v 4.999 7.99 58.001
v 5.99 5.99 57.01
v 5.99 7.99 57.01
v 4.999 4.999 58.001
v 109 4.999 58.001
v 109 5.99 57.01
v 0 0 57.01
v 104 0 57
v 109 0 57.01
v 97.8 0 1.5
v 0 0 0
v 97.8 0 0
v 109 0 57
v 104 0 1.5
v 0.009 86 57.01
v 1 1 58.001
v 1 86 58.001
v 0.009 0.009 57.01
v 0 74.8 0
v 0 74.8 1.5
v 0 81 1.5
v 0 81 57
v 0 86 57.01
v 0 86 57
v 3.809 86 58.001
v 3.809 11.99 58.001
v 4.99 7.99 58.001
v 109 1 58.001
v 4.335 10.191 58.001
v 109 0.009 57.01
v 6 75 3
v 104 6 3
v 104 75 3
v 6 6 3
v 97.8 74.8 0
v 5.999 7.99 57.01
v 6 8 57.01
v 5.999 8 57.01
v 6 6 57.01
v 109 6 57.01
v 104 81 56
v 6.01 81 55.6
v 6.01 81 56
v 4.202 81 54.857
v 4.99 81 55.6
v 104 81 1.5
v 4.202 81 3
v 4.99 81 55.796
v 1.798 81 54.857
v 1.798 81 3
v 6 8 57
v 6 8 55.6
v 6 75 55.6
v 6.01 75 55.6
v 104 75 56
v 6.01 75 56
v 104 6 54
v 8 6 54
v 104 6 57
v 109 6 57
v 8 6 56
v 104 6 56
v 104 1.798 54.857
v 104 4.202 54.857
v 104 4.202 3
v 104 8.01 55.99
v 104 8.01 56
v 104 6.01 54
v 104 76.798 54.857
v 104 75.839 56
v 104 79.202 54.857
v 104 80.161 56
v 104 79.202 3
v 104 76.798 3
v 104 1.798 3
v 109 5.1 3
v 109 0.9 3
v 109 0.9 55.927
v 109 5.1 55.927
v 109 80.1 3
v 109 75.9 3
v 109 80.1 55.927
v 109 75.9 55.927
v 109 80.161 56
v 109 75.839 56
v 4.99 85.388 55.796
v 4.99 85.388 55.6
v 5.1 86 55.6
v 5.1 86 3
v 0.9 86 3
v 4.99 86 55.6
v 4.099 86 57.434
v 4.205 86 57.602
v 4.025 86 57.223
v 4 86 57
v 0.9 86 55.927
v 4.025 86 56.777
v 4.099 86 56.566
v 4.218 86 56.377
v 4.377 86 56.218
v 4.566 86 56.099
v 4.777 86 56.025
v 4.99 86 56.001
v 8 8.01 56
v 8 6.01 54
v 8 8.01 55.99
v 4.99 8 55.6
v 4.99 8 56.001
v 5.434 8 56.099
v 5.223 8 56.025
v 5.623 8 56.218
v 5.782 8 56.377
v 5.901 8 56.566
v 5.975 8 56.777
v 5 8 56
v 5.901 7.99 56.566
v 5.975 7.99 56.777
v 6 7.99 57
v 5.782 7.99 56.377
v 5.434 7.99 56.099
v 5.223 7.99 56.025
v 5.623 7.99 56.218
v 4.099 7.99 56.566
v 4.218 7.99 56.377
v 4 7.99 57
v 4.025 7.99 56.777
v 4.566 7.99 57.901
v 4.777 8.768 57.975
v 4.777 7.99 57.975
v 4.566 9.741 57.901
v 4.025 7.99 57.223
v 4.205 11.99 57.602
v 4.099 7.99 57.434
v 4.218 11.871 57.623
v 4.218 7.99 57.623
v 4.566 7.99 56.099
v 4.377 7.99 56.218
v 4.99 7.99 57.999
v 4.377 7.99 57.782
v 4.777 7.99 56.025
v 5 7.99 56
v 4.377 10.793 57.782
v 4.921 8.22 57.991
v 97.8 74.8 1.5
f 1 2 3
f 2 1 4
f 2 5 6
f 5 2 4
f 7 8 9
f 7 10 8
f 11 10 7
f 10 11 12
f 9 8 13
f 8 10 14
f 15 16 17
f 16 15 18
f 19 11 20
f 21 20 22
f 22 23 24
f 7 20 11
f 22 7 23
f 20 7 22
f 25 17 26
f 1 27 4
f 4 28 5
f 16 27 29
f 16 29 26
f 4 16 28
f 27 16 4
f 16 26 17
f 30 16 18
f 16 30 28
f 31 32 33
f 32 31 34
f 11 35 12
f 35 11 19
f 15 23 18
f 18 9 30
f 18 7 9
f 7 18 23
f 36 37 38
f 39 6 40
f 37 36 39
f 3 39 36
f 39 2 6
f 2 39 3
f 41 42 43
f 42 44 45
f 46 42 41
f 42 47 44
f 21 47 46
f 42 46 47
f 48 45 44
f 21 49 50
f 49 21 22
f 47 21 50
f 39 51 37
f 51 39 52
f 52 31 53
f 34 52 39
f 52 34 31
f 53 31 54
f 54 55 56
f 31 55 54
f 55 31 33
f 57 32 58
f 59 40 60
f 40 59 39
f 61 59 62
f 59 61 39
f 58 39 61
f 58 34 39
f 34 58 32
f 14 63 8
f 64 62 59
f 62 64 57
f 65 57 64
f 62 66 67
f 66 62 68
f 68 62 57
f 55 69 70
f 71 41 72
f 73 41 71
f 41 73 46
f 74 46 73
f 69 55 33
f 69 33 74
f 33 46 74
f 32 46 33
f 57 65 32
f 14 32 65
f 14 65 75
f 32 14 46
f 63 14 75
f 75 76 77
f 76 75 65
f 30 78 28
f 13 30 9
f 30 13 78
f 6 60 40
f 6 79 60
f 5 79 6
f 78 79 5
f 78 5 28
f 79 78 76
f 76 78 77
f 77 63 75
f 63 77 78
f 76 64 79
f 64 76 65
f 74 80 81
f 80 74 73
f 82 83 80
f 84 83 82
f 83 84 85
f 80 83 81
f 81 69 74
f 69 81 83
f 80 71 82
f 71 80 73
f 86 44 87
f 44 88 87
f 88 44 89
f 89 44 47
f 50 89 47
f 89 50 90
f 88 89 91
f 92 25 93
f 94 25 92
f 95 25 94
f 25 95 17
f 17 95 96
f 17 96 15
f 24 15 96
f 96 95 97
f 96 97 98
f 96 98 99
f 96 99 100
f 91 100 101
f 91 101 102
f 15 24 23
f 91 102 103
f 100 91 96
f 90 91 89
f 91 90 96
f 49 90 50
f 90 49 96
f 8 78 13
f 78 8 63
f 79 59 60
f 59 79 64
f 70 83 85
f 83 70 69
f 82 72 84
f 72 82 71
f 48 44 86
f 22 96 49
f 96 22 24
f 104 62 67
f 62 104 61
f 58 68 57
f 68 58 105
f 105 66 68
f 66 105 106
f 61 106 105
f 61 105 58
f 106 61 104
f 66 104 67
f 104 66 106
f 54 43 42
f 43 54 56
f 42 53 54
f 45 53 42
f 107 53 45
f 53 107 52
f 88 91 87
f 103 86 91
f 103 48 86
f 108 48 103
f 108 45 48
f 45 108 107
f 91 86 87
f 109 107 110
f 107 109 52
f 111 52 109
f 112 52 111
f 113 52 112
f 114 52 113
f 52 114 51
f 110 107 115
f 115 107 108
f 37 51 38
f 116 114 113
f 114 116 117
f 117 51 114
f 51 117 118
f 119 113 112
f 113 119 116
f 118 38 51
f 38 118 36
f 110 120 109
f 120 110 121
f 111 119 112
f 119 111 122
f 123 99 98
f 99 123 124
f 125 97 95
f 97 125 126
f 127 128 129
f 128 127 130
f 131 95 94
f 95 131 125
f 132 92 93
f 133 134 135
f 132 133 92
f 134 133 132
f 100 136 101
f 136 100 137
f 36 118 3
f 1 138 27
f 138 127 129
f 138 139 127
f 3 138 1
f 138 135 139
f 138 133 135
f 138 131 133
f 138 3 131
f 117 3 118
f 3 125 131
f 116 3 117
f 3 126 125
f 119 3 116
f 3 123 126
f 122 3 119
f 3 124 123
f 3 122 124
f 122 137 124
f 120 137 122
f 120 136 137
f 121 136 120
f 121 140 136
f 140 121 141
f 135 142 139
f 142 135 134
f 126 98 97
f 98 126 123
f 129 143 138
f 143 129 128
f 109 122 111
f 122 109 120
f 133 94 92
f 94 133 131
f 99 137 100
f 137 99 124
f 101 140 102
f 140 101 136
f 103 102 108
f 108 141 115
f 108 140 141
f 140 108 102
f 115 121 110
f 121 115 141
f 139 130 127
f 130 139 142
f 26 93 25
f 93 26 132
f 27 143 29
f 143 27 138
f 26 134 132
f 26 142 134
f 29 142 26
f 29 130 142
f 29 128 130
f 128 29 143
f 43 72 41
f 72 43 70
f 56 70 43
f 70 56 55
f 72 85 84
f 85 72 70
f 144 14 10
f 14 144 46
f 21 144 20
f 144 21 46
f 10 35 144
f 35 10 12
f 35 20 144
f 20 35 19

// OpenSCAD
// ============================================================================
// cutlery_box.scad
// Graduated 3-chamber disposable-cutlery box (Option 3) — CUT-FROM-SOLID port
// of build_box.py, for a 120 x 120 x 120 mm printer (AOSEED).
//
// WHY THIS PORT EXISTS (the whole point):
//   The hand-mesh generator (build_box.py) could not keep the 1 mm rim chamfer
//   continuous across the female dovetail joints, because where a slot's flared
//   corner crosses the sloped chamfer it needs a true boolean intersection.
//   OpenSCAD HAS that boolean kernel, so here we do exactly the "cut-from-solid"
//   thing:
//      1. Build the ENTIRE box as ONE solid, WITH the chamfer already on it.
//      2. difference() out vertical dovetail prisms ( /_\ cross-section ),
//         running from just above the base plate up THROUGH the rim, to both
//         (a) form the sliding-dovetail joints, and
//         (b) split the box into 6 bed-sized pieces.
//   Because the cut is a real boolean through the already-chamfered solid, the
//   sloped chamfer<->slot edge is produced for free => the rim chamfer stays
//   CONTINUOUS across every joint, with none of the sliver hacks.
//
// ----------------------------------------------------------------------------
// HOW TO USE
//   In the app:  set `part` below (or use the Customizer dropdown), F5 to
//                preview, F6 to render, then File > Export > STL.
//   One piece (CLI):
//      openscad -o body_knife_A.stl -D 'part="knife_A"' cutlery_box.scad
//   ALL SIX (bash, run from this folder):
//      for p in knife_A knife_B fork_A fork_B spoon_A spoon_B; do \
//        openscad -o "body_$p.stl" -D "part=\"$p\"" cutlery_box.scad ; done
//   PNG preview of one piece:
//      openscad -o knife_B.png --imgsize=1400,1000 --autocenter --viewall \
//        -D 'part="knife_B"' cutlery_box.scad
//
//   Pieces are modelled in ASSEMBLED coordinates (floor-down, z=0 is the bed),
//   so importing all six STLs together shows the assembled box directly; your
//   slicer will auto-drop each one onto the plate for printing.
//
// BED SANITY: every piece is <= 120 mm in X, Y, Z.
//   Z = 58 mm. Widest piece = spoon at 117 mm (Y). A-halves reach 109 mm (X,
//   including the protruding dovetail key). All under 120.
//
// !! I could NOT run OpenSCAD to verify this file (no binary in my sandbox) !!
//   - The rim chamfer is a SMOOTH, true-45 bevel built from hull() frustums of
//     convex rectangles. Works in every OpenSCAD since ~2015 (incl. Homebrew
//     2021.01). No stepped staircase -- and, crucially, it makes box() a clean
//     well-formed solid so the per-part booleans resolve reliably (the old
//     14-slice staircase was fragile and CGAL was dropping the walls of the
//     interior parts, leaving only the key prisms => "floating boxes").
//   - roof() is still available behind USE_ROOF=true for those who have it
//     (2021.01+ snapshots); for THIS rectangular design it is identical, so it
//     is NOT required.
//   - After F6, check the console for "WARNING"/"not a valid 2-manifold".
//     If a tenon ever looks detached, bump EPS to 0.05.
// ============================================================================


/* [Part to render / export] */
part = "knife_A"; // [knife_A, knife_B, fork_A, fork_B, spoon_A, spoon_B, assembly]

/* [Chamfer method] */
// false = smooth hull() frustum bevel (default, any OpenSCAD); true = roof() (2021.01+)
USE_ROOF = false;

/* [Heights (mm)] */
BASE   = 3.0;     // floor / base-plate thickness
COMP_H = 55.0;    // interior wall height above the floor (cutlery stack depth)

/* [Walls (mm)] */
HOST_T   = 6.0;     // thickness of every wall (thick enough to host a dovetail)
HALF_LEN = 104.0;   // printed length of each half (A = near, B = far); <120 incl. key

/* [Chamber bays (mm)] */
N_COL     = 3;       // columns of cutlery per chamber
KNIFE_COL = 23.0;    // -> knife bay 69  (3 x 19 mm knives + play)
FORK_COL  = 33.0;    // -> fork  bay 99  (3 x 29 mm forks  + play)
SPOON_COL = 37.0;    // -> spoon bay 111 (3 x 34 mm spoons + play, trimmed <120)

/* [Dovetail joint (mm)] */
DT_DEPTH = 5.0;   // tail protrusion past the seam (male key depth)
DT_NECK  = 1.2;   // half-width at the seam face (narrow)
DT_FLARE = 2.1;   // half-width at the tip (wide -> locks)
DT_CLR   = 0.4;   // FLANK/seam slide clearance added to the female socket (do not change for fit)
DT_DEPTH_RELIEF = 0.3; // extra depth on the socket BACK only, so the tail tip never bottoms out

/* [Hidden-dovetail top cap / "hat" (mm)] */
// The dovetail otherwise shows its trapezoid outline on the TOP edge of the wall.
// To hide it, the MALE piece extends the wall's full-width top (chamfer included)
// across the key footprint -> a flush, continuous top. The FEMALE piece gets a
// matching top RECESS (cap footprint + CAP_CLR) so the cap drops straight in.
// Result: the top reads as one surface with a single straight seam line at the cap
// tip; the dovetail joinery lives entirely below the cap.
//
// SELF-SUPPORTING UNDERSIDE: the cap reaches the FULL wall width at the chamfer base
// (so the top edge reads as the wall extended, with NO recessed sliver on the outer
// face), and its underside is ONE planar ramp from the chamfer's OUTER CORNER
// (half-width HOST_T/2 at z = BODY_H-CHAMFER) down to the dovetail-neck half-width
// (CAP_FOOT) at CAP_SLANT_DEG from horizontal. No little horizontal step. The ramp
// reaching full width exactly at the chamfer base means "ramp top" == "chamfer base"
// (CAP_H is DERIVED). The FEMALE recess is the same ramp + CAP_CLR play.
// TRADEOFF: because the cap runs all the way to the outer corner, the female wall
// tapers to ~0 at z = BODY_H-CHAMFER -> a thin feather edge at the joint (gradual at
// CAP_SLANT_DEG, hidden inside the joint when assembled). Accepted per design intent.
CAP_SLANT_DEG = 50;     // cap underside ramp angle from horizontal (50 = self-supporting, long flare)
CAP_FOOT = DT_NECK;     // cap-underside half-width where it meets the dovetail neck
CAP_CLR = 0.3;          // slide clearance so the male cap seats into the female top recess

/* [Rim chamfer (mm)] */
CHAMFER = 1.0;    // 45-deg comfort break broken along the top wall edges

/* [Base half-lap / anti-warp (mm)] */
// Neighbouring base plates overlap as a HORIZONTAL half-lap (shiplap) at mid-base
// height, so corners stay coplanar (no lift/protrusion). Horizontal lap faces do
// NOT bind the vertical-drop assembly. Shingle direction: A->B and knife->fork->spoon.
LAP_LEN = 6;        // overlap past the A/B seam and the knife/fork seam
LAP_LEN_FS = 2;     // overlap past the fork/SPOON seam -- SMALLER: spoon is the
                    // tightest piece (117mm of the 120mm bed); a 6mm lap there
                    // would push spoon to 123mm. 2mm keeps spoon at 119mm.
LAP_Z   = BASE/2;   // 1.5 -- horizontal split height of the lap (bottom vs top half)
LAP_CLR = 0.2;      // in-plane clearance so the shelf isn't a press fit

/* [Lid — box features that receive a flat ORDERED clear sheet] */
// The lid itself is NOT printed: it's a flat ~2 mm PETG/Tritan sheet, bullnose-polished
// edges (r=LID_EDGE_R), ordered to size. We only model the box features that receive it.
LID_T            = 2.0;   // ordered sheet thickness
LID_EDGE_R       = 1.0;   // ordered sheet bullnose edge radius (for the sheet order spec)
LID_PLAY         = 0.4;   // total vertical play in the hinge groove (sheet + this)
HINGE_AT_MINUS_X = true;  // hinge on the -x (303mm) end wall; clip on +x. (flip = mirror; default delivered)
// perimeter support ledge (lid underside rests on it at z = BODY_H-LID_T)
LEDGE_W          = 2.0;   // ledge inward protrusion (its underside ramps back at 45 deg -> self-supporting)
GROOVE_END_INSET = CHAMFER + 1.0;  // groove starts one chamfer PAST the corner chamfer (derived from CHAMFER)
GROOVE_TAPER     = 4.0;   // y-length over which the eased mouth tapers out at each groove end
// hinge groove (cut into the inner face of the hinge end wall, CONTINUOUS along the long edge)
GROOVE_DEPTH     = 2.0;   // total depth into the wall (1.0 straight lead-in + 1.0 pocket radius)
GROOVE_POCKET_R  = 1.0;   // journal half-cylinder radius (the bullnose sheet edge rolls in it)
GROOVE_MOUTH_EASE= 1.2;   // 45 deg ease on the slot's inner-top lip so the sheet swings up & lifts out
// clip latch (one localized retainer, centered on the clip end wall)
CLIP_W           = 18.0;  // clip width
CLIP_LIP         = 0.4;   // retaining overhang (0.3 light .. 0.6 firm)
CLIP_RAMP_H      = 1.6;   // cam-ramp height above the rim (press-to-close)
// finger scallop (semicircular dish in the rim, centered on & aligned with the clip)
SCALLOP_W        = 16.0;  // scallop width
SCALLOP_DEPTH    = 6.0;   // how far it dishes down from the rim


/* [Hidden] */
EPS      = 0.01;          // tiny overlap so abutting solids fuse cleanly in CGAL
// Upper-chamber pieces (fork, spoon) were cut by a cell plane laid EXACTLY on the
// divider wall's far face (the lower chamber owns that wall). intersection() along a
// plane coincident with an existing box face makes CGAL leave a ZERO-THICKNESS copy
// of the wall face -> edge-manifold + "watertight" but degenerate (OpenSCAD shows it
// as a blue back-face; Tinkercad thickens it into a phantom block). SEAM_EPS nudges
// those cut planes a hair INTO the open bay so they no longer coincide with any box
// face -> no flap. 0.02 mm is physically nothing but is well clear of CGAL's tolerance.
SEAM_EPS = 0.02;
CUT_OVER = 1.0;           // how far dovetail cutters overshoot the rim (clean cut)

BODY_H    = BASE + COMP_H;     // 58  total height
END_WALL  = HOST_T;            // end walls are dovetail hosts too -> equally thick
TOTAL_LEN = 2 * HALF_LEN;      // 208 assembled length (end wall .. end wall)

// hidden-cap ramp geometry (derived).
//   CAP_HW    = cap MAX half-width = HOST_T/2 (the full wall edge) at the chamfer base.
//   CAP_RISE  = vertical height of the self-supporting CAP_SLANT_DEG underside ramp.
//   CAP_ZRAMP = where the cap reaches full width = the chamfer base (BODY_H-CHAMFER), so
//               the ramp runs straight to the chamfer OUTER CORNER (no horizontal step).
//   CAP_ZBOT  = cap bottom = ramp start; CAP_H derived from it (for reference/report).
//   CAP_ZRAMP_R = recess ramp top, shifted down by CAP_CLR so the recess ramp stays
//               parallel to the cap ramp with uniform play.
CAP_HW      = HOST_T/2;   // cap reaches the FULL wall edge at the chamfer base
CAP_RISE    = (CAP_HW - CAP_FOOT) * tan(CAP_SLANT_DEG);
CAP_ZRAMP   = BODY_H - CHAMFER;               // full width exactly at the chamfer base / outer corner
CAP_ZBOT    = CAP_ZRAMP - CAP_RISE;
CAP_H       = BODY_H - CAP_ZBOT;              // derived; reported
CAP_ZRAMP_R = CAP_ZRAMP;   // recess ramp ALSO tops at the chamfer corner (mirror the cap) -> no vertical lip
// sanity checks
assert(CAP_ZBOT > BASE + 1,
       "cap zone dips too low -- raise CAP_SLANT_DEG");
assert(CAP_HW >= DT_FLARE,
       "cap too narrow to cover the dovetail tail");

// NOTE: lid-derived constants are defined BELOW the Y-layout block, because some of
// them (INTERIOR_Y0/Y1, CLIP_CY) depend on OUTER_L / OUTER_R / EXT_W. See "lid derived".

// bay widths
KNIFE_BAY = N_COL * KNIFE_COL; // 69
FORK_BAY  = N_COL * FORK_COL;  // 99
SPOON_BAY = N_COL * SPOON_COL; // 111

// ---- Y layout (width direction): wall | bay | divider | bay | divider | bay | wall
KNIFE_Y0 = 0;
KNIFE_Y1 = HOST_T + KNIFE_BAY + HOST_T;        // 0..81   (outer wall + bay + divider)
FORK_Y0  = KNIFE_Y1;                           // 81
FORK_Y1  = FORK_Y0 + FORK_BAY + HOST_T;        // 81..186 (bay + divider)
SPOON_Y0 = FORK_Y1;                            // 186
SPOON_Y1 = SPOON_Y0 + SPOON_BAY + HOST_T;      // 186..303(bay + outer wall)
EXT_W    = SPOON_Y1;                           // 303 total width

// lengthwise wall Y-bands [y0,y1] (host the A/B dovetails) + their centers
OUTER_L  = [0, HOST_T];                                       // [0,6]    c=3
DIV_KF   = [HOST_T + KNIFE_BAY, HOST_T + KNIFE_BAY + HOST_T]; // [75,81]  c=78
DIV_FS   = [FORK_Y0 + FORK_BAY, FORK_Y0 + FORK_BAY + HOST_T]; // [180,186]c=183
OUTER_R  = [SPOON_Y1 - HOST_T, SPOON_Y1];                     // [297,303]c=300

// ---- lid derived ---- (placed AFTER OUTER_L/OUTER_R/EXT_W so nothing is forward-referenced)
LID_Z_UNDER = BODY_H - LID_T;             // 56  lid underside / ledge top / lowered-divider top
GROOVE_Z0   = BODY_H - (LID_T + LID_PLAY);// 55.6 groove bottom (top is the rim z=BODY_H, open to drop in)
POCKET_CZ   = BODY_H - LID_T/2;           // 57  journal pocket centre (sheet mid-thickness)
// hinge end-wall inner face x + inward direction; clip end-wall inner face x + inward dir
HINGE_INX   = HINGE_AT_MINUS_X ? END_WALL : TOTAL_LEN - END_WALL;       // 6  (default)
HINGE_IN    = HINGE_AT_MINUS_X ? 1 : -1;  // interior direction from the hinge wall (+x default)
CLIP_INX    = HINGE_AT_MINUS_X ? TOTAL_LEN - END_WALL : END_WALL;       // 202 (default)
CLIP_IN     = HINGE_AT_MINUS_X ? -1 : 1;  // interior direction from the clip wall (-x default)
POCKET_CX   = HINGE_INX - HINGE_IN*(GROOVE_DEPTH - GROOVE_POCKET_R);    // 5  pocket centre x (INTO the wall)
INTERIOR_Y0 = OUTER_L[1];                 // 6   inner face of the -y short wall
INTERIOR_Y1 = OUTER_R[0];                 // 297 inner face of the +y short wall
CLIP_CY     = EXT_W/2;                     // 151.5 clip/scallop centre (in the fork chamber)
assert(LID_Z_UNDER > CAP_ZBOT,
       "lid underside below the cap foot -- check LID_T vs cap geometry");

// the three OPEN bays are rectangular holes in the wall footprint:
//   footprint = outer rectangle MINUS these bays  (== the 6 walls; verified).
// The smooth chamfer is built from exactly this decomposition.
BAY_X0 = END_WALL;              // 6
BAY_X1 = TOTAL_LEN - END_WALL;  // 202
BAYS = [
    [BAY_X0, BAY_X1, HOST_T,   HOST_T + KNIFE_BAY],   // knife bay [6,202] x [6,75]
    [BAY_X0, BAY_X1, FORK_Y0,  FORK_Y0 + FORK_BAY],   // fork  bay [6,202] x [81,180]
    [BAY_X0, BAY_X1, SPOON_Y0, SPOON_Y0 + SPOON_BAY], // spoon bay [6,202] x [186,297]
];

YC_OUTL  = OUTER_L[0] + HOST_T/2;   // 3   outer-left wall center
YC_DIVKF = DIV_KF[0]  + HOST_T/2;   // 78  knife/fork divider center
YC_DIVFS = DIV_FS[0]  + HOST_T/2;   // 183 fork/spoon divider center
YC_OUTR  = OUTER_R[0] + HOST_T/2;   // 300 outer-right wall center

// seams
AB_SEAM = HALF_LEN;               // 104  A/B length seam (x)
SEAM_KF = FORK_Y0;                // 81   knife/fork width seam (y)
SEAM_FS = SPOON_Y0;              // 186  fork/spoon width seam (y)
ENDC_A  = END_WALL/2;             // 3    A end-wall center (x) -> chamber dovetails
ENDC_B  = TOTAL_LEN - END_WALL/2; // 205  B end-wall center (x)


// ============================================================================
// 2D wall footprint (cross-section of all walls, constant in z for the straight
// part). Union of: 2 full-width end walls + 4 lengthwise walls between them.
// ============================================================================
module wall_footprint_2d() {
    // footprint = outer rectangle minus the 3 open bays  (== the 6 walls)
    difference() {
        square([TOTAL_LEN, EXT_W]);
        for (b = BAYS) translate([b[0], b[2]]) square([b[1] - b[0], b[3] - b[2]]);
    }
}

// ============================================================================
// The full chamfered box solid = base plate + walls with a continuous 1 mm
// top-rim chamfer. Built ONCE; every piece is carved out of this.
// ============================================================================
module chamfer_cap() {
    // SMOOTH 45 rim chamfer over z[BODY_H-CHAMFER, BODY_H], in absolute coords.
    zm = BODY_H - CHAMFER;
    if (USE_ROOF) {
        // exact straight-skeleton roof, capped at CHAMFER height (needs roof()).
        intersection() {
            translate([0,0,zm]) roof() wall_footprint_2d();
            translate([0,0,zm]) linear_extrude(CHAMFER + EPS) wall_footprint_2d();
        }
    } else {
        // DEFAULT: true 45 bevel as hull() frustums of CONVEX rectangles -> smooth
        // AND a clean manifold.  Since footprint = outer - bays, the chamfer of the
        // footprint = (outer rectangle beveled inward) MINUS (each bay beveled so it
        // grows toward the top, which bevels every bay-facing rim).  All hull()s are
        // on convex rectangles, so nothing gets convex-filled.
        difference() {
            // outer perimeter frustum: full outer rect at zm -> inset by CHAMFER at top
            hull() {
                translate([0,0,zm])     linear_extrude(0.001) square([TOTAL_LEN, EXT_W]);
                translate([0,0,BODY_H]) linear_extrude(0.001) offset(delta=-CHAMFER) square([TOTAL_LEN, EXT_W]);
            }
            // each bay grows by CHAMFER toward the top -> bevels its surrounding rim.
            // (overshoots z a hair past both ends so the cut is clean.)
            for (b = BAYS)
                hull() {
                    translate([0,0,zm-EPS])     linear_extrude(0.001)
                        translate([b[0],b[2]]) offset(delta=-EPS)        square([b[1]-b[0], b[3]-b[2]]);
                    translate([0,0,BODY_H+EPS]) linear_extrude(0.001)
                        translate([b[0],b[2]]) offset(delta=CHAMFER+EPS) square([b[1]-b[0], b[3]-b[2]]);
                }
        }
    }
}

module box() {
    zm = BODY_H - CHAMFER;
    union() {
        cube([TOTAL_LEN, EXT_W, BASE]);                                        // base plate z[0,3]
        translate([0,0,BASE]) linear_extrude(zm - BASE + EPS) wall_footprint_2d(); // straight walls z[3,57]
        chamfer_cap();                                                         // smooth chamfer z[57,58]
    }
}

// ============================================================================
// Dovetail prisms ( /_\ ). Vertical, z[BASE, BODY_H+CUT_OVER] so they cut
// through the rim but leave the base plate continuous. The near face is pushed
// back EPS so a male key always fuses to its wall.
//   male key   : half_n=DT_NECK,         half_f=DT_FLARE
//   female slot: half_n=DT_NECK+DT_CLR,  half_f=DT_FLARE+DT_CLR
// ============================================================================
module dt_prism_X(seam_x, yc, half_n, half_f) {   // perpendicular to X, grows +X
    translate([0,0,BASE]) linear_extrude(BODY_H - BASE + CUT_OVER)
        polygon([[seam_x - EPS,        yc - half_n],
                 [seam_x + DT_DEPTH,   yc - half_f],
                 [seam_x + DT_DEPTH,   yc + half_f],
                 [seam_x - EPS,        yc + half_n]]);
}
module dt_prism_Y(seam_y, xc, half_n, half_f) {   // perpendicular to Y, grows +Y
    translate([0,0,BASE]) linear_extrude(BODY_H - BASE + CUT_OVER)
        polygon([[xc - half_n, seam_y - EPS],
                 [xc - half_f, seam_y + DT_DEPTH],
                 [xc + half_f, seam_y + DT_DEPTH],
                 [xc + half_n, seam_y - EPS]]);
}
module ab_key   (yc)        { dt_prism_X(AB_SEAM, yc, DT_NECK, DT_FLARE); }
module ch_key   (seam_y, xc){ dt_prism_Y(seam_y, xc, DT_NECK, DT_FLARE); }

// Female sockets = male + DT_CLR on the flanks/seam (unchanged), PLUS a straight
// back-face relief of DT_DEPTH_RELIEF so the tail tip never bottoms out. The
// relief is a rectangle tacked onto the trapezoid's tip at the SAME flare width,
// so the angled flank faces (and their 0.4 mm slide clearance) are untouched.
module ab_socket(yc) {
    dt_prism_X(AB_SEAM, yc, DT_NECK + DT_CLR, DT_FLARE + DT_CLR);
    translate([0,0,BASE]) linear_extrude(BODY_H - BASE + CUT_OVER)
        translate([AB_SEAM + DT_DEPTH, yc - (DT_FLARE + DT_CLR)])
            square([DT_DEPTH_RELIEF, 2*(DT_FLARE + DT_CLR)]);          // back relief, +X
}
module ch_socket(seam_y, xc) {
    dt_prism_Y(seam_y, xc, DT_NECK + DT_CLR, DT_FLARE + DT_CLR);
    translate([0,0,BASE]) linear_extrude(BODY_H - BASE + CUT_OVER)
        translate([xc - (DT_FLARE + DT_CLR), seam_y + DT_DEPTH])
            square([2*(DT_FLARE + DT_CLR), DT_DEPTH_RELIEF]);          // back relief, +Y
}

// ===== hidden-dovetail top cap ("hat"), SELF-SUPPORTING underside ===============
// MALE cap: a FULL-wall-width hat whose underside is ONE planar ramp from the chamfer's
// OUTER CORNER (half-width CAP_HW = HOST_T/2 at CAP_ZRAMP = BODY_H-CHAMFER) down to the
// dovetail-neck half-width (CAP_FOOT) at CAP_SLANT_DEG from horizontal -> the self-
// supporting shoulder, running straight to the corner (no horizontal step). Built as
// hull(narrow bottom slab buried in the tail neck, full-width top slab through the rim);
// box() trims it to the wall and adds the continuous rim chamfer for free, so the outer
// top edge reads as the wall extended (no recessed sliver). The protruding NOSE is left
// SQUARE (vertical) -- hidden in the female socket when assembled.
// TRADEOFF: the female wall tapers to ~0 at z=BODY_H-CHAMFER (a thin feather edge at the
// joint, gradual at CAP_SLANT_DEG) -- accepted per design intent.
module ab_cap(yc) {   // A/B seam, grows +X past the seam (length direction)
    hull() {
        translate([AB_SEAM - EPS, yc - CAP_FOOT, CAP_ZBOT])
            cube([DT_DEPTH + EPS, 2*CAP_FOOT, EPS]);
        translate([AB_SEAM - EPS, yc - CAP_HW,   CAP_ZRAMP])
            cube([DT_DEPTH + EPS, 2*CAP_HW, (BODY_H + CUT_OVER) - CAP_ZRAMP]);
    }
}
module ch_cap(seam_y, xc) {   // chamber seam, grows +Y past the seam (in the end wall)
    hull() {
        translate([xc - CAP_FOOT, seam_y - EPS, CAP_ZBOT])
            cube([2*CAP_FOOT, DT_DEPTH + EPS, EPS]);
        translate([xc - CAP_HW,   seam_y - EPS, CAP_ZRAMP])
            cube([2*CAP_HW, DT_DEPTH + EPS, (BODY_H + CUT_OVER) - CAP_ZRAMP]);
    }
}
// FEMALE recess: the SAME ramp grown by CAP_CLR (flanks, tip, floor, and ramp shifted down
// by CAP_CLR so it stays parallel) -> the cap seats with uniform slide clearance. It opens
// to the wall edge (and a hair past, into air) so the cap's full-width corner drops in;
// this is what leaves the thin female feather at the top (accepted). Open upward + toward seam.
module ab_cap_neg(yc) {
    hull() {
        translate([AB_SEAM - EPS, yc - (CAP_FOOT + CAP_CLR), CAP_ZBOT - CAP_CLR])
            cube([DT_DEPTH + CAP_CLR + EPS, 2*(CAP_FOOT + CAP_CLR), EPS]);
        translate([AB_SEAM - EPS, yc - (CAP_HW + EPS), CAP_ZRAMP_R])
            cube([DT_DEPTH + CAP_CLR + EPS, 2*(CAP_HW + EPS), (BODY_H + CUT_OVER + 1) - CAP_ZRAMP_R]);
    }
}
module ch_cap_neg(seam_y, xc) {
    hull() {
        translate([xc - (CAP_FOOT + CAP_CLR), seam_y - EPS, CAP_ZBOT - CAP_CLR])
            cube([2*(CAP_FOOT + CAP_CLR), DT_DEPTH + CAP_CLR + EPS, EPS]);
        translate([xc - (CAP_HW + EPS), seam_y - EPS, CAP_ZRAMP_R])
            cube([2*(CAP_HW + EPS), DT_DEPTH + CAP_CLR + EPS, (BODY_H + CUT_OVER + 1) - CAP_ZRAMP_R]);
    }
}

// rectangular cell (x[xa,xb], y[ya,yb], full height + margin) used to split pieces
module cell(xa, xb, ya, yb) {
    translate([xa, ya, -1]) cube([xb - xa, yb - ya, BODY_H + 11]);
}

// ===== base half-lap (shiplap) =================================================
// HORIZONTAL lap at mid-base height: the shelf-owner keeps its BOTTOM half
// (z 0..LAP_Z) extending LAP_LEN past the seam; the neighbour has its bottom half
// REMOVED there (keeps only the top half) and lands flat on the shelf. Horizontal
// faces => no binding during the vertical drop. Shelves live entirely in the base
// (z < BASE), well clear of the wall dovetails (z >= BASE).
// Shingle = FEMALE-first (matches the no-notch dovetail assembly order, which
// lowers the male piece onto the female): the B half owns the A/B shelf (grows
// -X into A) and the UPPER chamber (fork, spoon) owns the chamber shelf (grows
// -Y into the lower chamber).  Order: spoon, fork, knife; B before A.
module lap_shelf_X(y0, y1) {                 // B-side shelf, grows -X into A past AB_SEAM
    // +EPS past AB_SEAM so the shelf interpenetrates (not just abuts) its own B body -> fuses cleanly.
    translate([AB_SEAM - LAP_LEN, y0, 0]) cube([LAP_LEN + EPS, y1 - y0, LAP_Z]);
}
module lap_neg_X(y0, y1) {                   // A-side: remove bottom half to receive it
    translate([AB_SEAM - LAP_LEN - LAP_CLR, y0 - EPS, -EPS])
        cube([LAP_LEN + LAP_CLR + EPS, (y1 - y0) + 2*EPS, LAP_Z + EPS]);
}
module lap_shelf_Y(seam_y, x0, x1, ln=LAP_LEN) {   // upper-chamber shelf, grows -Y into lower
    // grows -Y by `ln` into the lower chamber AND +Y by 2*SEAM_EPS past the seam so it
    // always overlaps the (SEAM_EPS-nudged) body floor and stays fused -> no floating shelf.
    translate([x0, seam_y - ln, 0]) cube([x1 - x0, ln + 2*SEAM_EPS, LAP_Z]);
}
module lap_neg_Y(seam_y, x0, x1, ln=LAP_LEN) {     // lower-chamber: remove bottom half
    translate([x0 - EPS, seam_y - ln - LAP_CLR, -EPS])
        cube([(x1 - x0) + 2*EPS, ln + LAP_CLR + EPS, LAP_Z + EPS]);
}

// ============================================================================
// LID FEATURES (receive a flat ORDERED clear sheet; the sheet is not printed).
// All features live at the TOP (z >= ~52), ABOVE the dovetail engagement, the half-lap
// (z<1.5) and most of the hat, so the vertical-drop assembly and joints are untouched.
// EPS overlaps throughout; no coincident coplanar faces with the existing walls.
// Default orientation: HINGE on the -x end wall (A pieces), CLIP on the +x end wall
// (B pieces), clip+scallop centred on the fork (middle) chamber.
// ============================================================================

// --- perimeter support ledge: 45-deg self-supporting brackets; rest face at LID_Z_UNDER.
//     Runs along the CLIP end wall + the two short outer walls. (Hinge wall uses the groove.)
//     Built as hull(thin top edge, wall column) -> a triangular bracket whose underside is
//     a 45-deg ramp (prints floor-down with no support). ADDED to each piece (clipped by cell).
//     Each run is INSET by LEDGE_W from the perpendicular walls so the three brackets never
//     overlap at a corner and the wall's normal chamfer wraps every corner uninterrupted.
module lid_ledge() {
    cy0 = INTERIOR_Y0 + LEDGE_W;  cy1 = INTERIOR_Y1 - LEDGE_W;  cyl = cy1 - cy0;   // clip-run y span (inset)
    sx0 = END_WALL    + LEDGE_W;  sxl = (TOTAL_LEN - 2*END_WALL) - 2*LEDGE_W;       // short-run x span (inset)
    // clip end wall (x = CLIP_INX), bracket protrudes toward interior (CLIP_IN)
    hull() {
        translate([CLIP_INX + CLIP_IN*LEDGE_W, cy0, LID_Z_UNDER - EPS]) cube([EPS, cyl, EPS]);
        translate([CLIP_INX - EPS,             cy0, LID_Z_UNDER - LEDGE_W]) cube([2*EPS, cyl, LEDGE_W]);
    }
    // OUTER_L short wall (y = INTERIOR_Y0), bracket protrudes +y
    hull() {
        translate([sx0, INTERIOR_Y0 + LEDGE_W, LID_Z_UNDER - EPS]) cube([sxl, EPS, EPS]);
        translate([sx0, INTERIOR_Y0 - EPS,     LID_Z_UNDER - LEDGE_W]) cube([sxl, 2*EPS, LEDGE_W]);
    }
    // OUTER_R short wall (y = INTERIOR_Y1), bracket protrudes -y
    hull() {
        translate([sx0, INTERIOR_Y1 - LEDGE_W, LID_Z_UNDER - EPS]) cube([sxl, EPS, EPS]);
        translate([sx0, INTERIOR_Y1 - EPS,     LID_Z_UNDER - LEDGE_W]) cube([sxl, 2*EPS, LEDGE_W]);
    }
}

// --- hinge groove: a straight lead-in slot + a journal half-cylinder pocket + a 45-deg
//     mouth-ease on the wall-top behind the pocket (so the rigid sheet swings up wide and
//     can still lift out). Cut into the inner face of the HINGE end wall. CONTINUOUS along
//     the whole long edge (y ~7..296); it shaves only the top ~2.4mm inner tips of the two
//     chamber dovetails -- their engagement below GROOVE_Z0 and the 4mm outer wall remain.
//     The eased mouth TAPERS to nothing over GROOVE_TAPER at each end so it doesn't leave a
//     stub at the corners; the slot is open at the rim (z=BODY_H) so the sheet edge drops in.
EPX_MOUTH = POCKET_CX;   // mouth-ease eases the SLOT inner-top edge so it merges with slot+pocket
                         // (anchoring at the pocket back left a thin undercut lip -> flap; fixed)
module mouth_slab(yc, dy) {                          // thin full-depth mouth-ease slice centred at yc
    translate([0, yc - dy/2, 0]) rotate([90,0,0]) translate([0,0,-dy]) linear_extrude(dy)
        polygon([[EPX_MOUTH, BODY_H + EPS],
                 [EPX_MOUTH - HINGE_IN*GROOVE_MOUTH_EASE, BODY_H + EPS],
                 [EPX_MOUTH, BODY_H - GROOVE_MOUTH_EASE]]);
}
module mouth_taper(yApex, yFull) {                   // wedge: vanishes at yApex, full at yFull
    hull() {
        mouth_slab(yFull, 2*EPS);
        translate([EPX_MOUTH - EPS, yApex - EPS, BODY_H - EPS]) cube([2*EPS, 2*EPS, 2*EPS]);
    }
}
module hinge_groove() {
    gy0 = INTERIOR_Y0 + GROOVE_END_INSET;            // 7    start (inset from -y short wall)
    gy1 = INTERIOR_Y1 - GROOVE_END_INSET;            // 296  end   (inset from +y short wall)
    sx0 = min(POCKET_CX, HINGE_INX);  sx1 = max(POCKET_CX, HINGE_INX);
    // straight lead-in slot (open to rim) + journal pocket, continuous
    translate([sx0 - EPS, gy0, GROOVE_Z0]) cube([sx1 - sx0 + 2*EPS, gy1 - gy0, BODY_H - GROOVE_Z0 + EPS]);
    translate([POCKET_CX, gy0 - EPS, POCKET_CZ]) rotate([-90,0,0]) cylinder(h = gy1 - gy0 + 2*EPS, r = GROOVE_POCKET_R, $fn = 28);
    // eased mouth: full-depth middle prism + a tapered wedge at each end
    mt = min(GROOVE_TAPER, (gy1 - gy0)/2 - EPS);
    translate([0, gy0 + mt, 0]) rotate([90,0,0]) translate([0,0,-((gy1 - mt) - (gy0 + mt))]) linear_extrude((gy1 - mt) - (gy0 + mt))
        polygon([[EPX_MOUTH, BODY_H + EPS],
                 [EPX_MOUTH - HINGE_IN*GROOVE_MOUTH_EASE, BODY_H + EPS],
                 [EPX_MOUTH, BODY_H - GROOVE_MOUTH_EASE]]);
    mouth_taper(gy0, gy0 + mt);                       // taper up from the -y corner
    mouth_taper(gy1, gy1 - mt);                       // taper down to the +y corner
}

// --- lower the inner chamber dividers to the lid underside (mid-support, no sag).
//     Removes the divider top over the full length; outer walls keep full height.
module divider_lower() {
    // x-span is the CHAMBER BAY only [BAY_X0, BAY_X1] (+EPS overlap into the end walls so the
    // cut is manifold). The end/outer walls keep their full BODY_H tops; only the two INNER
    // dividers (DIV_KF, DIV_FS) are lowered.
    translate([BAY_X0 - EPS, DIV_KF[0], LID_Z_UNDER]) cube([BAY_X1 - BAY_X0 + 2*EPS, HOST_T, BODY_H - LID_Z_UNDER + CUT_OVER]);
    translate([BAY_X0 - EPS, DIV_FS[0], LID_Z_UNDER]) cube([BAY_X1 - BAY_X0 + 2*EPS, HOST_T, BODY_H - LID_Z_UNDER + CUT_OVER]);
}

// --- retaining clip (ADDED): a cam-ramped lip on the clip end wall, centred on CLIP_CY.
//     Lip underside at the rim (z=BODY_H) overhangs the lid top by CLIP_LIP; ramp above
//     cams the lid under on close. Anchored into the wall (base at +/- HOST_T/2). Added
//     AFTER the scallop cut so the scallop never undercuts it.
module lid_clip() {
    translate([0, CLIP_CY - CLIP_W/2, 0]) rotate([90,0,0]) translate([0,0,-CLIP_W]) linear_extrude(CLIP_W)
        polygon([[CLIP_INX - CLIP_IN*HOST_T/2, BODY_H - EPS],            // base, into the wall (fuse)
                 [CLIP_INX + CLIP_IN*CLIP_LIP, BODY_H],                  // lip tip (overhang over lid)
                 [CLIP_INX + CLIP_IN*CLIP_LIP, BODY_H + 0.6],            // lip front
                 [CLIP_INX - CLIP_IN*HOST_T/2, BODY_H + CLIP_RAMP_H]]);  // ramp top at the wall
}

// --- finger scallop (CUT): a semicircular dish in the rim's INNER edge at the clip, so a
//     fingertip reaches under the lid edge to release it. Interior half only (does not
//     touch the wall body or the clip's anchor).
module lid_scallop() {
    intersection() {
        translate([CLIP_INX, CLIP_CY, BODY_H - SCALLOP_DEPTH]) cylinder(h = SCALLOP_DEPTH + EPS, r = SCALLOP_W/2, $fn = 40);
        translate([CLIP_INX + (CLIP_IN<0 ? -SCALLOP_W : 0), CLIP_CY - SCALLOP_W, BODY_H - SCALLOP_DEPTH - EPS])
            cube([SCALLOP_W, 2*SCALLOP_W, SCALLOP_DEPTH + 2*EPS]);
    }
}

// ============================================================================
// The six pieces.  piece = intersection(box, cell + own male keys) - own sockets
//   A halves are MALE on the A/B seam (keep the key); B halves are FEMALE (slot).
//   On a chamber seam the LEFT chamber is male (+Y), the right chamber is female.
// ============================================================================
// Base half-lap shingling (FEMALE-first, Option 1):
//   A/B seam  -> the B half owns the bottom shelf (grows -X), A has the negative.
//   chamber   -> the UPPER chamber (fork, spoon) owns the shelf (grows -Y); the
//                lower chamber (knife, fork) has the negative.
//   Assembly order: spoon, fork, knife; B before A (male lowered onto female).
// Center crossings (104,81)&(104,186): the CHAMBER shelf (fork_A / spoon_A) owns the
//   crossing square; the B-half A/B shelf (knife_B / fork_B) is CLIPPED short of the
//   chamber seam by LAP_LEN so two shelves never collide.
module knife_A() {                                       // placed LAST; receives everything
    difference() {
        union() {
            intersection() {
                box();
                union() {
                    cell(-1, AB_SEAM, KNIFE_Y0 - 1, KNIFE_Y1);
                    ab_key(YC_OUTL); ab_key(YC_DIVKF); ch_key(SEAM_KF, ENDC_A);
                    ab_cap(YC_OUTL); ab_cap(YC_DIVKF); ch_cap(SEAM_KF, ENDC_A);  // hide tops (male)
                }
            }
            intersection() { lid_ledge(); cell(-1, AB_SEAM, KNIFE_Y0 - 1, KNIFE_Y1); }  // lid support ledge
        }
        lap_neg_X(KNIFE_Y0, KNIFE_Y1);            // receive knife_B's A/B shelf
        lap_neg_Y(SEAM_KF, 0, AB_SEAM);           // receive fork_A's chamber shelf
        hinge_groove(); divider_lower(); lid_scallop();   // lid cuts (groove hits A pieces; divider/scallop where present)
    }
}

module knife_B() {
    difference() {
        union() {
            intersection() {
                box();
                union() {
                    cell(AB_SEAM, TOTAL_LEN + 1, KNIFE_Y0 - 1, KNIFE_Y1);
                    ch_key(SEAM_KF, ENDC_B);
                    ch_cap(SEAM_KF, ENDC_B);                // hide top (male, chamber)
                }
            }
            lap_shelf_X(KNIFE_Y0, KNIFE_Y1 - LAP_LEN);  // A/B shelf -> knife_A (CLIPPED at y=81 crossing)
            intersection() { lid_ledge(); cell(AB_SEAM, TOTAL_LEN + 1, KNIFE_Y0 - 1, KNIFE_Y1); }  // lid support ledge
        }
        ab_socket(YC_OUTL); ab_socket(YC_DIVKF);
        ab_cap_neg(YC_OUTL); ab_cap_neg(YC_DIVKF);      // top recesses to receive knife_A's caps (female)
        lap_neg_Y(SEAM_KF, AB_SEAM, TOTAL_LEN);         // receive fork_B's chamber shelf
        hinge_groove(); divider_lower(); lid_scallop();   // lid cuts
    }
}

module fork_A() {
    difference() {
        union() {
            intersection() {
                box();
                union() {
                    cell(-1, AB_SEAM, FORK_Y0 + SEAM_EPS, FORK_Y1);  // -Y cut nudged off the divider face
                    ab_key(YC_DIVFS); ch_key(SEAM_FS, ENDC_A);
                    ab_cap(YC_DIVFS); ch_cap(SEAM_FS, ENDC_A);       // hide tops (male)
                }
            }
            lap_shelf_Y(SEAM_KF, 0, AB_SEAM);           // chamber shelf -> knife_A (owns crossing)
            intersection() { lid_ledge(); cell(-1, AB_SEAM, FORK_Y0 + SEAM_EPS, FORK_Y1); }  // lid support ledge (none in fork-A)
        }
        lap_neg_X(FORK_Y0, FORK_Y1);                    // receive fork_B's A/B shelf
        ch_socket(SEAM_KF, ENDC_A);
        ch_cap_neg(SEAM_KF, ENDC_A);                    // top recess to receive knife_A's chamber cap (female)
        lap_neg_Y(SEAM_FS, 0, AB_SEAM, LAP_LEN_FS);     // receive spoon_A's (small) chamber shelf
        hinge_groove(); divider_lower(); lid_scallop();   // lid cuts (groove = fork-A hinge segment; divider = DIV_FS)
    }
}

module fork_B() {
    union() {
        difference() {
            union() {
                intersection() {
                    box();
                    union() {
                        cell(AB_SEAM, TOTAL_LEN + 1, FORK_Y0 + SEAM_EPS, FORK_Y1);  // -Y cut nudged off the divider face
                        ch_key(SEAM_FS, ENDC_B);
                        ch_cap(SEAM_FS, ENDC_B);                // hide top (male, chamber)
                    }
                }
                lap_shelf_X(FORK_Y0, FORK_Y1 - LAP_LEN_FS); // A/B shelf -> fork_A (CLIPPED at y=186 crossing)
                lap_shelf_Y(SEAM_KF, AB_SEAM, TOTAL_LEN);   // chamber shelf -> knife_B
                intersection() { lid_ledge(); cell(AB_SEAM, TOTAL_LEN + 1, FORK_Y0 + SEAM_EPS, FORK_Y1); }  // lid ledge (clip-end run)
            }
            ab_socket(YC_DIVFS);
            ab_cap_neg(YC_DIVFS);                           // top recess to receive fork_A's A/B cap (female)
            ch_socket(SEAM_KF, ENDC_B);
            ch_cap_neg(SEAM_KF, ENDC_B);                    // top recess to receive knife_B's chamber cap (female)
            lap_neg_Y(SEAM_FS, AB_SEAM, TOTAL_LEN, LAP_LEN_FS); // receive spoon_B's (small) chamber shelf
            hinge_groove(); divider_lower(); lid_scallop();     // lid cuts (scallop lands here)
        }
        intersection() { lid_clip(); cell(AB_SEAM, TOTAL_LEN + 1, FORK_Y0 + SEAM_EPS, FORK_Y1); }  // retaining clip, added AFTER the scallop cut
    }
}

module spoon_A() {
    difference() {
        union() {
            intersection() {
                box();
                union() {
                    cell(-1, AB_SEAM, SPOON_Y0 + SEAM_EPS, SPOON_Y1 + 1);  // -Y cut nudged off the divider face
                    ab_key(YC_OUTR);
                    ab_cap(YC_OUTR);                        // hide top (male)
                }
            }
            lap_shelf_Y(SEAM_FS, 0, AB_SEAM, LAP_LEN_FS); // chamber shelf -> fork_A (small; owns crossing)
            intersection() { lid_ledge(); cell(-1, AB_SEAM, SPOON_Y0 + SEAM_EPS, SPOON_Y1 + 1); }  // lid support ledge (OUTER_R run)
        }
        lap_neg_X(SPOON_Y0, SPOON_Y1);                  // receive spoon_B's A/B shelf
        ch_socket(SEAM_FS, ENDC_A);
        ch_cap_neg(SEAM_FS, ENDC_A);                    // top recess to receive fork_A's chamber cap (female)
        hinge_groove(); divider_lower(); lid_scallop();   // lid cuts (groove = spoon-A hinge segment)
    }
}

module spoon_B() {                                      // placed FIRST; owns shelves
    difference() {
        union() {
            intersection() {
                box();
                union() {
                    cell(AB_SEAM, TOTAL_LEN + 1, SPOON_Y0 + SEAM_EPS, SPOON_Y1 + 1);  // -Y cut nudged off the divider face
                }
            }
            lap_shelf_X(SPOON_Y0, SPOON_Y1);            // A/B shelf -> spoon_A
            lap_shelf_Y(SEAM_FS, AB_SEAM, TOTAL_LEN, LAP_LEN_FS); // chamber shelf -> fork_B (small)
            intersection() { lid_ledge(); cell(AB_SEAM, TOTAL_LEN + 1, SPOON_Y0 + SEAM_EPS, SPOON_Y1 + 1); }  // lid ledge (OUTER_R + clip-end runs)
        }
        ab_socket(YC_OUTR);
        ab_cap_neg(YC_OUTR);                            // top recess to receive spoon_A's A/B cap (female)
        ch_socket(SEAM_FS, ENDC_B);
        ch_cap_neg(SEAM_FS, ENDC_B);                    // top recess to receive fork_B's chamber cap (female)
        hinge_groove(); divider_lower(); lid_scallop();   // lid cuts
    }
}

// Fast preview: the full continuous-chamfer box (no cuts). The six part modules
// above are the real, separable pieces. To instead see the TRUE assembled
// pieces with their joints (slower — 6 booleans), replace box(); below with:
//   knife_A(); knife_B(); fork_A(); fork_B(); spoon_A(); spoon_B();
module assembly() {
    box();
}

// ============================================================================
// Render dispatch
// ============================================================================
if      (part == "knife_A")  knife_A();
else if (part == "knife_B")  knife_B();
else if (part == "fork_A")   fork_A();
else if (part == "fork_B")   fork_B();
else if (part == "spoon_A")  spoon_A();
else if (part == "spoon_B")  spoon_B();
else if (part == "assembly") assembly();
else echo(str("Unknown part: ", part));
